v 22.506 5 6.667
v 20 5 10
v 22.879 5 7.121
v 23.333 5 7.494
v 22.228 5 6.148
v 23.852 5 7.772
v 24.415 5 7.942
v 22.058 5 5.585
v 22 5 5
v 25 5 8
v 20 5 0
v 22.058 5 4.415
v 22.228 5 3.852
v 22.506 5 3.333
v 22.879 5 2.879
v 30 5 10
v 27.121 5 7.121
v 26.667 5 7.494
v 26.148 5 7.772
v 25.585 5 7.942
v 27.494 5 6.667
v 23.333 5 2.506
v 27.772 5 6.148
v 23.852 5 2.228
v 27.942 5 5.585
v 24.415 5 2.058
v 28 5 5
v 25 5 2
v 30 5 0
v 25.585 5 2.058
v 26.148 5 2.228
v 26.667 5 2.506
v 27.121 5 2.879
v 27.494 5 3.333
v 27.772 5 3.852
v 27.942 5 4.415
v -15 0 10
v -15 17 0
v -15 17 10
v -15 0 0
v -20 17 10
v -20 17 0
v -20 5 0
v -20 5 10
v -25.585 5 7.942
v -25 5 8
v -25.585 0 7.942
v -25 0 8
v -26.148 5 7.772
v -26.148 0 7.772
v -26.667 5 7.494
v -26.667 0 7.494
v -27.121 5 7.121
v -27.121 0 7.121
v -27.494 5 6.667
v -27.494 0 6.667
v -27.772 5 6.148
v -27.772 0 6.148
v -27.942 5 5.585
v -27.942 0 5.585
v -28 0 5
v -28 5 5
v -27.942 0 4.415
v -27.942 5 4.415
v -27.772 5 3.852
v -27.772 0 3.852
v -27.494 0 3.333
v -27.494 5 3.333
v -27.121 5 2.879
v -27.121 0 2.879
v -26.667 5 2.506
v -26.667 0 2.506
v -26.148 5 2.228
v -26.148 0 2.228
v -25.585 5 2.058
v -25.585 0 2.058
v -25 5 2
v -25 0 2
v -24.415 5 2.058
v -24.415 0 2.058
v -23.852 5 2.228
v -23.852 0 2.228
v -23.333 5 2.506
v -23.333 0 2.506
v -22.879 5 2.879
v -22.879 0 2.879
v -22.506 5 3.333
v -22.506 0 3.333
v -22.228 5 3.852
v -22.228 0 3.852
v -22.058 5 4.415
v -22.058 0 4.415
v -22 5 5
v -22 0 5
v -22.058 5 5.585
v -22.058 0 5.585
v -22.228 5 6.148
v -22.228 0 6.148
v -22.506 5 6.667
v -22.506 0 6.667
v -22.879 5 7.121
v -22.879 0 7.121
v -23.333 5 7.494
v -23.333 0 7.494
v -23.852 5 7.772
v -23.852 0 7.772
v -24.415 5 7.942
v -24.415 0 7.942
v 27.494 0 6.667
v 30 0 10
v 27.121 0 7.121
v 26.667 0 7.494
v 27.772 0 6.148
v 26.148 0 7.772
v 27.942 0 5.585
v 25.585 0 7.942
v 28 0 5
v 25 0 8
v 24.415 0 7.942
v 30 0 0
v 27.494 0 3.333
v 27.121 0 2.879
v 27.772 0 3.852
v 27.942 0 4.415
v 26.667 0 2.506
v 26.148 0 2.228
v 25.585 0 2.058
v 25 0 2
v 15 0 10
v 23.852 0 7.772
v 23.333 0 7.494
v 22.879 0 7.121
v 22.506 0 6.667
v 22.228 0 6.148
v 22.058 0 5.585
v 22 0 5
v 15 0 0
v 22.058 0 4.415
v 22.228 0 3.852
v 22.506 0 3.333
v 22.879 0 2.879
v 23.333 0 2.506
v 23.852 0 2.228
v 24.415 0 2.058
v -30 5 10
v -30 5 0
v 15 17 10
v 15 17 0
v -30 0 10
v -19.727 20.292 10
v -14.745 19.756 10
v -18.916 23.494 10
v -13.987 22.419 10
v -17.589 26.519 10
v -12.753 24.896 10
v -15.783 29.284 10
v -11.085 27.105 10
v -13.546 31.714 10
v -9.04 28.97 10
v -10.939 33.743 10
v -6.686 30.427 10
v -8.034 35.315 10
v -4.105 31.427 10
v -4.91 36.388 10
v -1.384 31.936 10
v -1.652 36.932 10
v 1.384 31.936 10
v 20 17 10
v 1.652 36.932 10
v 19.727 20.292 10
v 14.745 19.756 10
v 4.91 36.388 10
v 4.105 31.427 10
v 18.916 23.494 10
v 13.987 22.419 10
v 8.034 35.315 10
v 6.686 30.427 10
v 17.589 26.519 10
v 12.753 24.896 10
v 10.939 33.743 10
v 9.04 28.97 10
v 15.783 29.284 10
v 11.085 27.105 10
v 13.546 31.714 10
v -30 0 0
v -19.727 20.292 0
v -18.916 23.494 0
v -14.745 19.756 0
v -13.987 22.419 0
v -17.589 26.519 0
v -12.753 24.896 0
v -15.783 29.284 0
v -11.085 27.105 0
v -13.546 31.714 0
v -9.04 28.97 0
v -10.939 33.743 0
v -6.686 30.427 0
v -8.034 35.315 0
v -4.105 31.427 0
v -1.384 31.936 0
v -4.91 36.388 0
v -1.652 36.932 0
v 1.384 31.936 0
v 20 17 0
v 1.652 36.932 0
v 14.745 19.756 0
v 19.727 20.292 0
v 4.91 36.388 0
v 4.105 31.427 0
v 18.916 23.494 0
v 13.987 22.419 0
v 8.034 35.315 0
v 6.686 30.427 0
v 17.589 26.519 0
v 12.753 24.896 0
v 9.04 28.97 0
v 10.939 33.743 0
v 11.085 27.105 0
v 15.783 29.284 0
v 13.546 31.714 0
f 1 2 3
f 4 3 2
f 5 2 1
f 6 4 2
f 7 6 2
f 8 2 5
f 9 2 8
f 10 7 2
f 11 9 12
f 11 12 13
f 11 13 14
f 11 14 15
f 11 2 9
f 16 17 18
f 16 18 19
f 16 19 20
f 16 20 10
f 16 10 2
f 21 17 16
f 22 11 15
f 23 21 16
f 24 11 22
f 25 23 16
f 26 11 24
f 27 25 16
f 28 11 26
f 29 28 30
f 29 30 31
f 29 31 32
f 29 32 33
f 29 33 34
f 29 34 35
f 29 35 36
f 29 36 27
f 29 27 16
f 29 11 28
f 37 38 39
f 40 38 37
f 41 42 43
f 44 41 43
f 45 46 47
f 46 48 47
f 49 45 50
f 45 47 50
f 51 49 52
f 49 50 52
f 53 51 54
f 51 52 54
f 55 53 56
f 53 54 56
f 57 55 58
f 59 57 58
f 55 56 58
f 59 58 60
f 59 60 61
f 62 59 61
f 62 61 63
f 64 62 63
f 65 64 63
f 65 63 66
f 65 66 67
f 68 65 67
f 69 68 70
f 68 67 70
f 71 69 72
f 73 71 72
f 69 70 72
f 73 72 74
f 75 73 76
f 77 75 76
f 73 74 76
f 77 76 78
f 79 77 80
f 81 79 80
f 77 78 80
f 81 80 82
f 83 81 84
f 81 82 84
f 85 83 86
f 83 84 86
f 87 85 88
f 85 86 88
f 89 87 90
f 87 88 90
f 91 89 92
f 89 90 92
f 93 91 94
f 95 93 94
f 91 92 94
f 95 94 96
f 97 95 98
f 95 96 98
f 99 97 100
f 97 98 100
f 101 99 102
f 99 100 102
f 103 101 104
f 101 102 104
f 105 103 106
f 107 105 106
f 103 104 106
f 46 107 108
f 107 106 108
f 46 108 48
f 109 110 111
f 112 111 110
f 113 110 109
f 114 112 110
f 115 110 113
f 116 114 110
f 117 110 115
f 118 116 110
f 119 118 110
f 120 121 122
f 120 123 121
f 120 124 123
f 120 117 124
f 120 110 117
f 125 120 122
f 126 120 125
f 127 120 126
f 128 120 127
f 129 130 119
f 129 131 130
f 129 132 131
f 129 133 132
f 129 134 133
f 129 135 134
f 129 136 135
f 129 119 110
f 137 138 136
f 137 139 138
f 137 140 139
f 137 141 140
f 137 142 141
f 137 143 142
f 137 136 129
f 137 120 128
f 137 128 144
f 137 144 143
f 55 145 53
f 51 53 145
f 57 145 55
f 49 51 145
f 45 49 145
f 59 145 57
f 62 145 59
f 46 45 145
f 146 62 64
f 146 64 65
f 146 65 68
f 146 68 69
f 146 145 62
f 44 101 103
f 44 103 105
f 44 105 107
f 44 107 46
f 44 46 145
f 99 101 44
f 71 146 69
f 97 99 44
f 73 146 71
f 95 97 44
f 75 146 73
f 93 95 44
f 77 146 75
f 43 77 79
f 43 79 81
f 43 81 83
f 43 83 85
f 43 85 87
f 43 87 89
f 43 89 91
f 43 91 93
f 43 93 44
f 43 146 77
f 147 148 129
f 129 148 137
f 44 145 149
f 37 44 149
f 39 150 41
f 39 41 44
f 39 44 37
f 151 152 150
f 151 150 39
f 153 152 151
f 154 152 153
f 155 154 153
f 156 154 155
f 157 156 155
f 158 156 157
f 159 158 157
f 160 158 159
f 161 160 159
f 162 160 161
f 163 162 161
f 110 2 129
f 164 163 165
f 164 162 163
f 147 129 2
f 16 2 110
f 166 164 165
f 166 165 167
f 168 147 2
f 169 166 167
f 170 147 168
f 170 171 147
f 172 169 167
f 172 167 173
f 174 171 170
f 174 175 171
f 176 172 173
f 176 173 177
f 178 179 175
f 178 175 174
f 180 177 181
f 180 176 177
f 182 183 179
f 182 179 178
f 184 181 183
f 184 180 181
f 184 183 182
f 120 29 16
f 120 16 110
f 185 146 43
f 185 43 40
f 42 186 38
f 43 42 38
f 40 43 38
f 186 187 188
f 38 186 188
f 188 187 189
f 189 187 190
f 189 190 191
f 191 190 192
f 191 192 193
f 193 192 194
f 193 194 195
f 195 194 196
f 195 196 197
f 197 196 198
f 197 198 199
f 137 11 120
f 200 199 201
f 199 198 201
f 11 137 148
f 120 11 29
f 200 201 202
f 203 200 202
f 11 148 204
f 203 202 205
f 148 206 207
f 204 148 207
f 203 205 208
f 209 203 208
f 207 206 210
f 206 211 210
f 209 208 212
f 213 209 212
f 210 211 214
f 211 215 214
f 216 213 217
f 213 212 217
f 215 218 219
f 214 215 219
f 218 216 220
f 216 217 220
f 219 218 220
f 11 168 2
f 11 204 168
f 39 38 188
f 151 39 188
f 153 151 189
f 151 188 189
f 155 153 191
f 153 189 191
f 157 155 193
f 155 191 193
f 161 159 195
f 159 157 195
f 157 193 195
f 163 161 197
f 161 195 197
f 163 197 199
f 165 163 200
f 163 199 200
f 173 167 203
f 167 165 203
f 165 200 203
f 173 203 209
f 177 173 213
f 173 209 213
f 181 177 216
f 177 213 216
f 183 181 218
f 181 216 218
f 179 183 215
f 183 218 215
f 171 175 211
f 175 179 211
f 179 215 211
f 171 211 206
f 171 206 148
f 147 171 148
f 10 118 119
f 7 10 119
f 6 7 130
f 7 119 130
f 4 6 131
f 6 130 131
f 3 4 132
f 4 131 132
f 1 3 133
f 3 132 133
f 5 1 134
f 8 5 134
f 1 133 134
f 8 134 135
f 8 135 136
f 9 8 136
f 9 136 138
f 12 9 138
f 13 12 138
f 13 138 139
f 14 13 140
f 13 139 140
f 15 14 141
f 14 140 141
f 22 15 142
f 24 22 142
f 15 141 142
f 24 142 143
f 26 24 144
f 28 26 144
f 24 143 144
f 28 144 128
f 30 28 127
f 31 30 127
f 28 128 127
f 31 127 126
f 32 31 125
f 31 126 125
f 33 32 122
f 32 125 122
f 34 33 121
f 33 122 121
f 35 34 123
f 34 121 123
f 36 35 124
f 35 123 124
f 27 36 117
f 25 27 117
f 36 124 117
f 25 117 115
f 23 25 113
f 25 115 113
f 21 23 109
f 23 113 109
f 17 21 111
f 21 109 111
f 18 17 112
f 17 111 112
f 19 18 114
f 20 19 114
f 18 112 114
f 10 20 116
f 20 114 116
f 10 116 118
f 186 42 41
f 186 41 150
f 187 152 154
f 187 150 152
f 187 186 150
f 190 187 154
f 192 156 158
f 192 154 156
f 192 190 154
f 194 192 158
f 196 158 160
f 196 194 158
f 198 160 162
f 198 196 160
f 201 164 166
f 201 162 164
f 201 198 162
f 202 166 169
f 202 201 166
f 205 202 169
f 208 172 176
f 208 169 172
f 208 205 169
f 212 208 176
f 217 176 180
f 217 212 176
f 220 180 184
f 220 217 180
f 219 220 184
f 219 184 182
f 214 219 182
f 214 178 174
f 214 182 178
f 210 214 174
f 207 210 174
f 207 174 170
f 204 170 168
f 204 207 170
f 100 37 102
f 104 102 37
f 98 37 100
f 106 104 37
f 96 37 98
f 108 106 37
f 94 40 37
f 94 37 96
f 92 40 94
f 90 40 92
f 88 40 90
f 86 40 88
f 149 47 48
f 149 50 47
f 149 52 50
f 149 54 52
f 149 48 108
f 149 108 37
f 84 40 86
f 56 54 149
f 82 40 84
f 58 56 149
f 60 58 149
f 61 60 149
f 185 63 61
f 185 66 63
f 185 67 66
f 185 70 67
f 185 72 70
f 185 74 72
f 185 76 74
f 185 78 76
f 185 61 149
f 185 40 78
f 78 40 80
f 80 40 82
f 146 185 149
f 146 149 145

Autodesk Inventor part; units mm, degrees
ref_plane "YZ Plane" through (0, 0, 0) normal (1, 0, 0) x (0, 1, 0)
ref_plane "XZ Plane" through (0, 0, 0) normal (0, 1, 0) x (-1, 0, 0)
ref_plane "XY Plane" through (0, 0, 0) normal (0, 0, 1) x (1, 0, 0)
sketch "Sketch1" plane through (0, 0, 0) normal (0, 0, 1) x (1, 0, 0)
  arc A0 (15, 17) -> (-15, 17) centre (0, 17) ccw
  line L0 (20, 17) -> (20, 0)
  line L1 (-20, 17) -> (-20, 0)
  line L2 (30, 5) -> (30, 0)
  line L3 (30, 0) -> (-30, 0)
  line L4 (-30, 0) -> (-30, 5)
  line L5 (15, 17) -> (15, 0)
  line L6 (-15, 17) -> (-15, 0)
  arc A1 (20, 17) -> (-20, 17) centre (0, 17) ccw
  line L7 (-30, 5) -> (-20, 5)
  line L8 (20, 5) -> (30, 5)
  point P0 (0, 0)
  point P1 (0, 0)
  dimension "d0" = 30
  dimension "d1" = 17
  dimension "d3" = 60
  dimension "d5" = 20
  dimension "d6" = 5
  dimension "d7" = 5
extrude "Extrusion1" add sketch "Sketch1" along normal blind 10 contours A0 L6 L3 L1 A1 L0 L5 | L0 L8 L2 L3 | L3 L4 L7 L1
hole "Hole1" at (25, 5, 5) direction (0, -1, 0) diameter 6 end through all
hole "Hole2" at (-25, 5, 5) direction (0, -1, 0) diameter 6 end through all
properties part number "holder"
